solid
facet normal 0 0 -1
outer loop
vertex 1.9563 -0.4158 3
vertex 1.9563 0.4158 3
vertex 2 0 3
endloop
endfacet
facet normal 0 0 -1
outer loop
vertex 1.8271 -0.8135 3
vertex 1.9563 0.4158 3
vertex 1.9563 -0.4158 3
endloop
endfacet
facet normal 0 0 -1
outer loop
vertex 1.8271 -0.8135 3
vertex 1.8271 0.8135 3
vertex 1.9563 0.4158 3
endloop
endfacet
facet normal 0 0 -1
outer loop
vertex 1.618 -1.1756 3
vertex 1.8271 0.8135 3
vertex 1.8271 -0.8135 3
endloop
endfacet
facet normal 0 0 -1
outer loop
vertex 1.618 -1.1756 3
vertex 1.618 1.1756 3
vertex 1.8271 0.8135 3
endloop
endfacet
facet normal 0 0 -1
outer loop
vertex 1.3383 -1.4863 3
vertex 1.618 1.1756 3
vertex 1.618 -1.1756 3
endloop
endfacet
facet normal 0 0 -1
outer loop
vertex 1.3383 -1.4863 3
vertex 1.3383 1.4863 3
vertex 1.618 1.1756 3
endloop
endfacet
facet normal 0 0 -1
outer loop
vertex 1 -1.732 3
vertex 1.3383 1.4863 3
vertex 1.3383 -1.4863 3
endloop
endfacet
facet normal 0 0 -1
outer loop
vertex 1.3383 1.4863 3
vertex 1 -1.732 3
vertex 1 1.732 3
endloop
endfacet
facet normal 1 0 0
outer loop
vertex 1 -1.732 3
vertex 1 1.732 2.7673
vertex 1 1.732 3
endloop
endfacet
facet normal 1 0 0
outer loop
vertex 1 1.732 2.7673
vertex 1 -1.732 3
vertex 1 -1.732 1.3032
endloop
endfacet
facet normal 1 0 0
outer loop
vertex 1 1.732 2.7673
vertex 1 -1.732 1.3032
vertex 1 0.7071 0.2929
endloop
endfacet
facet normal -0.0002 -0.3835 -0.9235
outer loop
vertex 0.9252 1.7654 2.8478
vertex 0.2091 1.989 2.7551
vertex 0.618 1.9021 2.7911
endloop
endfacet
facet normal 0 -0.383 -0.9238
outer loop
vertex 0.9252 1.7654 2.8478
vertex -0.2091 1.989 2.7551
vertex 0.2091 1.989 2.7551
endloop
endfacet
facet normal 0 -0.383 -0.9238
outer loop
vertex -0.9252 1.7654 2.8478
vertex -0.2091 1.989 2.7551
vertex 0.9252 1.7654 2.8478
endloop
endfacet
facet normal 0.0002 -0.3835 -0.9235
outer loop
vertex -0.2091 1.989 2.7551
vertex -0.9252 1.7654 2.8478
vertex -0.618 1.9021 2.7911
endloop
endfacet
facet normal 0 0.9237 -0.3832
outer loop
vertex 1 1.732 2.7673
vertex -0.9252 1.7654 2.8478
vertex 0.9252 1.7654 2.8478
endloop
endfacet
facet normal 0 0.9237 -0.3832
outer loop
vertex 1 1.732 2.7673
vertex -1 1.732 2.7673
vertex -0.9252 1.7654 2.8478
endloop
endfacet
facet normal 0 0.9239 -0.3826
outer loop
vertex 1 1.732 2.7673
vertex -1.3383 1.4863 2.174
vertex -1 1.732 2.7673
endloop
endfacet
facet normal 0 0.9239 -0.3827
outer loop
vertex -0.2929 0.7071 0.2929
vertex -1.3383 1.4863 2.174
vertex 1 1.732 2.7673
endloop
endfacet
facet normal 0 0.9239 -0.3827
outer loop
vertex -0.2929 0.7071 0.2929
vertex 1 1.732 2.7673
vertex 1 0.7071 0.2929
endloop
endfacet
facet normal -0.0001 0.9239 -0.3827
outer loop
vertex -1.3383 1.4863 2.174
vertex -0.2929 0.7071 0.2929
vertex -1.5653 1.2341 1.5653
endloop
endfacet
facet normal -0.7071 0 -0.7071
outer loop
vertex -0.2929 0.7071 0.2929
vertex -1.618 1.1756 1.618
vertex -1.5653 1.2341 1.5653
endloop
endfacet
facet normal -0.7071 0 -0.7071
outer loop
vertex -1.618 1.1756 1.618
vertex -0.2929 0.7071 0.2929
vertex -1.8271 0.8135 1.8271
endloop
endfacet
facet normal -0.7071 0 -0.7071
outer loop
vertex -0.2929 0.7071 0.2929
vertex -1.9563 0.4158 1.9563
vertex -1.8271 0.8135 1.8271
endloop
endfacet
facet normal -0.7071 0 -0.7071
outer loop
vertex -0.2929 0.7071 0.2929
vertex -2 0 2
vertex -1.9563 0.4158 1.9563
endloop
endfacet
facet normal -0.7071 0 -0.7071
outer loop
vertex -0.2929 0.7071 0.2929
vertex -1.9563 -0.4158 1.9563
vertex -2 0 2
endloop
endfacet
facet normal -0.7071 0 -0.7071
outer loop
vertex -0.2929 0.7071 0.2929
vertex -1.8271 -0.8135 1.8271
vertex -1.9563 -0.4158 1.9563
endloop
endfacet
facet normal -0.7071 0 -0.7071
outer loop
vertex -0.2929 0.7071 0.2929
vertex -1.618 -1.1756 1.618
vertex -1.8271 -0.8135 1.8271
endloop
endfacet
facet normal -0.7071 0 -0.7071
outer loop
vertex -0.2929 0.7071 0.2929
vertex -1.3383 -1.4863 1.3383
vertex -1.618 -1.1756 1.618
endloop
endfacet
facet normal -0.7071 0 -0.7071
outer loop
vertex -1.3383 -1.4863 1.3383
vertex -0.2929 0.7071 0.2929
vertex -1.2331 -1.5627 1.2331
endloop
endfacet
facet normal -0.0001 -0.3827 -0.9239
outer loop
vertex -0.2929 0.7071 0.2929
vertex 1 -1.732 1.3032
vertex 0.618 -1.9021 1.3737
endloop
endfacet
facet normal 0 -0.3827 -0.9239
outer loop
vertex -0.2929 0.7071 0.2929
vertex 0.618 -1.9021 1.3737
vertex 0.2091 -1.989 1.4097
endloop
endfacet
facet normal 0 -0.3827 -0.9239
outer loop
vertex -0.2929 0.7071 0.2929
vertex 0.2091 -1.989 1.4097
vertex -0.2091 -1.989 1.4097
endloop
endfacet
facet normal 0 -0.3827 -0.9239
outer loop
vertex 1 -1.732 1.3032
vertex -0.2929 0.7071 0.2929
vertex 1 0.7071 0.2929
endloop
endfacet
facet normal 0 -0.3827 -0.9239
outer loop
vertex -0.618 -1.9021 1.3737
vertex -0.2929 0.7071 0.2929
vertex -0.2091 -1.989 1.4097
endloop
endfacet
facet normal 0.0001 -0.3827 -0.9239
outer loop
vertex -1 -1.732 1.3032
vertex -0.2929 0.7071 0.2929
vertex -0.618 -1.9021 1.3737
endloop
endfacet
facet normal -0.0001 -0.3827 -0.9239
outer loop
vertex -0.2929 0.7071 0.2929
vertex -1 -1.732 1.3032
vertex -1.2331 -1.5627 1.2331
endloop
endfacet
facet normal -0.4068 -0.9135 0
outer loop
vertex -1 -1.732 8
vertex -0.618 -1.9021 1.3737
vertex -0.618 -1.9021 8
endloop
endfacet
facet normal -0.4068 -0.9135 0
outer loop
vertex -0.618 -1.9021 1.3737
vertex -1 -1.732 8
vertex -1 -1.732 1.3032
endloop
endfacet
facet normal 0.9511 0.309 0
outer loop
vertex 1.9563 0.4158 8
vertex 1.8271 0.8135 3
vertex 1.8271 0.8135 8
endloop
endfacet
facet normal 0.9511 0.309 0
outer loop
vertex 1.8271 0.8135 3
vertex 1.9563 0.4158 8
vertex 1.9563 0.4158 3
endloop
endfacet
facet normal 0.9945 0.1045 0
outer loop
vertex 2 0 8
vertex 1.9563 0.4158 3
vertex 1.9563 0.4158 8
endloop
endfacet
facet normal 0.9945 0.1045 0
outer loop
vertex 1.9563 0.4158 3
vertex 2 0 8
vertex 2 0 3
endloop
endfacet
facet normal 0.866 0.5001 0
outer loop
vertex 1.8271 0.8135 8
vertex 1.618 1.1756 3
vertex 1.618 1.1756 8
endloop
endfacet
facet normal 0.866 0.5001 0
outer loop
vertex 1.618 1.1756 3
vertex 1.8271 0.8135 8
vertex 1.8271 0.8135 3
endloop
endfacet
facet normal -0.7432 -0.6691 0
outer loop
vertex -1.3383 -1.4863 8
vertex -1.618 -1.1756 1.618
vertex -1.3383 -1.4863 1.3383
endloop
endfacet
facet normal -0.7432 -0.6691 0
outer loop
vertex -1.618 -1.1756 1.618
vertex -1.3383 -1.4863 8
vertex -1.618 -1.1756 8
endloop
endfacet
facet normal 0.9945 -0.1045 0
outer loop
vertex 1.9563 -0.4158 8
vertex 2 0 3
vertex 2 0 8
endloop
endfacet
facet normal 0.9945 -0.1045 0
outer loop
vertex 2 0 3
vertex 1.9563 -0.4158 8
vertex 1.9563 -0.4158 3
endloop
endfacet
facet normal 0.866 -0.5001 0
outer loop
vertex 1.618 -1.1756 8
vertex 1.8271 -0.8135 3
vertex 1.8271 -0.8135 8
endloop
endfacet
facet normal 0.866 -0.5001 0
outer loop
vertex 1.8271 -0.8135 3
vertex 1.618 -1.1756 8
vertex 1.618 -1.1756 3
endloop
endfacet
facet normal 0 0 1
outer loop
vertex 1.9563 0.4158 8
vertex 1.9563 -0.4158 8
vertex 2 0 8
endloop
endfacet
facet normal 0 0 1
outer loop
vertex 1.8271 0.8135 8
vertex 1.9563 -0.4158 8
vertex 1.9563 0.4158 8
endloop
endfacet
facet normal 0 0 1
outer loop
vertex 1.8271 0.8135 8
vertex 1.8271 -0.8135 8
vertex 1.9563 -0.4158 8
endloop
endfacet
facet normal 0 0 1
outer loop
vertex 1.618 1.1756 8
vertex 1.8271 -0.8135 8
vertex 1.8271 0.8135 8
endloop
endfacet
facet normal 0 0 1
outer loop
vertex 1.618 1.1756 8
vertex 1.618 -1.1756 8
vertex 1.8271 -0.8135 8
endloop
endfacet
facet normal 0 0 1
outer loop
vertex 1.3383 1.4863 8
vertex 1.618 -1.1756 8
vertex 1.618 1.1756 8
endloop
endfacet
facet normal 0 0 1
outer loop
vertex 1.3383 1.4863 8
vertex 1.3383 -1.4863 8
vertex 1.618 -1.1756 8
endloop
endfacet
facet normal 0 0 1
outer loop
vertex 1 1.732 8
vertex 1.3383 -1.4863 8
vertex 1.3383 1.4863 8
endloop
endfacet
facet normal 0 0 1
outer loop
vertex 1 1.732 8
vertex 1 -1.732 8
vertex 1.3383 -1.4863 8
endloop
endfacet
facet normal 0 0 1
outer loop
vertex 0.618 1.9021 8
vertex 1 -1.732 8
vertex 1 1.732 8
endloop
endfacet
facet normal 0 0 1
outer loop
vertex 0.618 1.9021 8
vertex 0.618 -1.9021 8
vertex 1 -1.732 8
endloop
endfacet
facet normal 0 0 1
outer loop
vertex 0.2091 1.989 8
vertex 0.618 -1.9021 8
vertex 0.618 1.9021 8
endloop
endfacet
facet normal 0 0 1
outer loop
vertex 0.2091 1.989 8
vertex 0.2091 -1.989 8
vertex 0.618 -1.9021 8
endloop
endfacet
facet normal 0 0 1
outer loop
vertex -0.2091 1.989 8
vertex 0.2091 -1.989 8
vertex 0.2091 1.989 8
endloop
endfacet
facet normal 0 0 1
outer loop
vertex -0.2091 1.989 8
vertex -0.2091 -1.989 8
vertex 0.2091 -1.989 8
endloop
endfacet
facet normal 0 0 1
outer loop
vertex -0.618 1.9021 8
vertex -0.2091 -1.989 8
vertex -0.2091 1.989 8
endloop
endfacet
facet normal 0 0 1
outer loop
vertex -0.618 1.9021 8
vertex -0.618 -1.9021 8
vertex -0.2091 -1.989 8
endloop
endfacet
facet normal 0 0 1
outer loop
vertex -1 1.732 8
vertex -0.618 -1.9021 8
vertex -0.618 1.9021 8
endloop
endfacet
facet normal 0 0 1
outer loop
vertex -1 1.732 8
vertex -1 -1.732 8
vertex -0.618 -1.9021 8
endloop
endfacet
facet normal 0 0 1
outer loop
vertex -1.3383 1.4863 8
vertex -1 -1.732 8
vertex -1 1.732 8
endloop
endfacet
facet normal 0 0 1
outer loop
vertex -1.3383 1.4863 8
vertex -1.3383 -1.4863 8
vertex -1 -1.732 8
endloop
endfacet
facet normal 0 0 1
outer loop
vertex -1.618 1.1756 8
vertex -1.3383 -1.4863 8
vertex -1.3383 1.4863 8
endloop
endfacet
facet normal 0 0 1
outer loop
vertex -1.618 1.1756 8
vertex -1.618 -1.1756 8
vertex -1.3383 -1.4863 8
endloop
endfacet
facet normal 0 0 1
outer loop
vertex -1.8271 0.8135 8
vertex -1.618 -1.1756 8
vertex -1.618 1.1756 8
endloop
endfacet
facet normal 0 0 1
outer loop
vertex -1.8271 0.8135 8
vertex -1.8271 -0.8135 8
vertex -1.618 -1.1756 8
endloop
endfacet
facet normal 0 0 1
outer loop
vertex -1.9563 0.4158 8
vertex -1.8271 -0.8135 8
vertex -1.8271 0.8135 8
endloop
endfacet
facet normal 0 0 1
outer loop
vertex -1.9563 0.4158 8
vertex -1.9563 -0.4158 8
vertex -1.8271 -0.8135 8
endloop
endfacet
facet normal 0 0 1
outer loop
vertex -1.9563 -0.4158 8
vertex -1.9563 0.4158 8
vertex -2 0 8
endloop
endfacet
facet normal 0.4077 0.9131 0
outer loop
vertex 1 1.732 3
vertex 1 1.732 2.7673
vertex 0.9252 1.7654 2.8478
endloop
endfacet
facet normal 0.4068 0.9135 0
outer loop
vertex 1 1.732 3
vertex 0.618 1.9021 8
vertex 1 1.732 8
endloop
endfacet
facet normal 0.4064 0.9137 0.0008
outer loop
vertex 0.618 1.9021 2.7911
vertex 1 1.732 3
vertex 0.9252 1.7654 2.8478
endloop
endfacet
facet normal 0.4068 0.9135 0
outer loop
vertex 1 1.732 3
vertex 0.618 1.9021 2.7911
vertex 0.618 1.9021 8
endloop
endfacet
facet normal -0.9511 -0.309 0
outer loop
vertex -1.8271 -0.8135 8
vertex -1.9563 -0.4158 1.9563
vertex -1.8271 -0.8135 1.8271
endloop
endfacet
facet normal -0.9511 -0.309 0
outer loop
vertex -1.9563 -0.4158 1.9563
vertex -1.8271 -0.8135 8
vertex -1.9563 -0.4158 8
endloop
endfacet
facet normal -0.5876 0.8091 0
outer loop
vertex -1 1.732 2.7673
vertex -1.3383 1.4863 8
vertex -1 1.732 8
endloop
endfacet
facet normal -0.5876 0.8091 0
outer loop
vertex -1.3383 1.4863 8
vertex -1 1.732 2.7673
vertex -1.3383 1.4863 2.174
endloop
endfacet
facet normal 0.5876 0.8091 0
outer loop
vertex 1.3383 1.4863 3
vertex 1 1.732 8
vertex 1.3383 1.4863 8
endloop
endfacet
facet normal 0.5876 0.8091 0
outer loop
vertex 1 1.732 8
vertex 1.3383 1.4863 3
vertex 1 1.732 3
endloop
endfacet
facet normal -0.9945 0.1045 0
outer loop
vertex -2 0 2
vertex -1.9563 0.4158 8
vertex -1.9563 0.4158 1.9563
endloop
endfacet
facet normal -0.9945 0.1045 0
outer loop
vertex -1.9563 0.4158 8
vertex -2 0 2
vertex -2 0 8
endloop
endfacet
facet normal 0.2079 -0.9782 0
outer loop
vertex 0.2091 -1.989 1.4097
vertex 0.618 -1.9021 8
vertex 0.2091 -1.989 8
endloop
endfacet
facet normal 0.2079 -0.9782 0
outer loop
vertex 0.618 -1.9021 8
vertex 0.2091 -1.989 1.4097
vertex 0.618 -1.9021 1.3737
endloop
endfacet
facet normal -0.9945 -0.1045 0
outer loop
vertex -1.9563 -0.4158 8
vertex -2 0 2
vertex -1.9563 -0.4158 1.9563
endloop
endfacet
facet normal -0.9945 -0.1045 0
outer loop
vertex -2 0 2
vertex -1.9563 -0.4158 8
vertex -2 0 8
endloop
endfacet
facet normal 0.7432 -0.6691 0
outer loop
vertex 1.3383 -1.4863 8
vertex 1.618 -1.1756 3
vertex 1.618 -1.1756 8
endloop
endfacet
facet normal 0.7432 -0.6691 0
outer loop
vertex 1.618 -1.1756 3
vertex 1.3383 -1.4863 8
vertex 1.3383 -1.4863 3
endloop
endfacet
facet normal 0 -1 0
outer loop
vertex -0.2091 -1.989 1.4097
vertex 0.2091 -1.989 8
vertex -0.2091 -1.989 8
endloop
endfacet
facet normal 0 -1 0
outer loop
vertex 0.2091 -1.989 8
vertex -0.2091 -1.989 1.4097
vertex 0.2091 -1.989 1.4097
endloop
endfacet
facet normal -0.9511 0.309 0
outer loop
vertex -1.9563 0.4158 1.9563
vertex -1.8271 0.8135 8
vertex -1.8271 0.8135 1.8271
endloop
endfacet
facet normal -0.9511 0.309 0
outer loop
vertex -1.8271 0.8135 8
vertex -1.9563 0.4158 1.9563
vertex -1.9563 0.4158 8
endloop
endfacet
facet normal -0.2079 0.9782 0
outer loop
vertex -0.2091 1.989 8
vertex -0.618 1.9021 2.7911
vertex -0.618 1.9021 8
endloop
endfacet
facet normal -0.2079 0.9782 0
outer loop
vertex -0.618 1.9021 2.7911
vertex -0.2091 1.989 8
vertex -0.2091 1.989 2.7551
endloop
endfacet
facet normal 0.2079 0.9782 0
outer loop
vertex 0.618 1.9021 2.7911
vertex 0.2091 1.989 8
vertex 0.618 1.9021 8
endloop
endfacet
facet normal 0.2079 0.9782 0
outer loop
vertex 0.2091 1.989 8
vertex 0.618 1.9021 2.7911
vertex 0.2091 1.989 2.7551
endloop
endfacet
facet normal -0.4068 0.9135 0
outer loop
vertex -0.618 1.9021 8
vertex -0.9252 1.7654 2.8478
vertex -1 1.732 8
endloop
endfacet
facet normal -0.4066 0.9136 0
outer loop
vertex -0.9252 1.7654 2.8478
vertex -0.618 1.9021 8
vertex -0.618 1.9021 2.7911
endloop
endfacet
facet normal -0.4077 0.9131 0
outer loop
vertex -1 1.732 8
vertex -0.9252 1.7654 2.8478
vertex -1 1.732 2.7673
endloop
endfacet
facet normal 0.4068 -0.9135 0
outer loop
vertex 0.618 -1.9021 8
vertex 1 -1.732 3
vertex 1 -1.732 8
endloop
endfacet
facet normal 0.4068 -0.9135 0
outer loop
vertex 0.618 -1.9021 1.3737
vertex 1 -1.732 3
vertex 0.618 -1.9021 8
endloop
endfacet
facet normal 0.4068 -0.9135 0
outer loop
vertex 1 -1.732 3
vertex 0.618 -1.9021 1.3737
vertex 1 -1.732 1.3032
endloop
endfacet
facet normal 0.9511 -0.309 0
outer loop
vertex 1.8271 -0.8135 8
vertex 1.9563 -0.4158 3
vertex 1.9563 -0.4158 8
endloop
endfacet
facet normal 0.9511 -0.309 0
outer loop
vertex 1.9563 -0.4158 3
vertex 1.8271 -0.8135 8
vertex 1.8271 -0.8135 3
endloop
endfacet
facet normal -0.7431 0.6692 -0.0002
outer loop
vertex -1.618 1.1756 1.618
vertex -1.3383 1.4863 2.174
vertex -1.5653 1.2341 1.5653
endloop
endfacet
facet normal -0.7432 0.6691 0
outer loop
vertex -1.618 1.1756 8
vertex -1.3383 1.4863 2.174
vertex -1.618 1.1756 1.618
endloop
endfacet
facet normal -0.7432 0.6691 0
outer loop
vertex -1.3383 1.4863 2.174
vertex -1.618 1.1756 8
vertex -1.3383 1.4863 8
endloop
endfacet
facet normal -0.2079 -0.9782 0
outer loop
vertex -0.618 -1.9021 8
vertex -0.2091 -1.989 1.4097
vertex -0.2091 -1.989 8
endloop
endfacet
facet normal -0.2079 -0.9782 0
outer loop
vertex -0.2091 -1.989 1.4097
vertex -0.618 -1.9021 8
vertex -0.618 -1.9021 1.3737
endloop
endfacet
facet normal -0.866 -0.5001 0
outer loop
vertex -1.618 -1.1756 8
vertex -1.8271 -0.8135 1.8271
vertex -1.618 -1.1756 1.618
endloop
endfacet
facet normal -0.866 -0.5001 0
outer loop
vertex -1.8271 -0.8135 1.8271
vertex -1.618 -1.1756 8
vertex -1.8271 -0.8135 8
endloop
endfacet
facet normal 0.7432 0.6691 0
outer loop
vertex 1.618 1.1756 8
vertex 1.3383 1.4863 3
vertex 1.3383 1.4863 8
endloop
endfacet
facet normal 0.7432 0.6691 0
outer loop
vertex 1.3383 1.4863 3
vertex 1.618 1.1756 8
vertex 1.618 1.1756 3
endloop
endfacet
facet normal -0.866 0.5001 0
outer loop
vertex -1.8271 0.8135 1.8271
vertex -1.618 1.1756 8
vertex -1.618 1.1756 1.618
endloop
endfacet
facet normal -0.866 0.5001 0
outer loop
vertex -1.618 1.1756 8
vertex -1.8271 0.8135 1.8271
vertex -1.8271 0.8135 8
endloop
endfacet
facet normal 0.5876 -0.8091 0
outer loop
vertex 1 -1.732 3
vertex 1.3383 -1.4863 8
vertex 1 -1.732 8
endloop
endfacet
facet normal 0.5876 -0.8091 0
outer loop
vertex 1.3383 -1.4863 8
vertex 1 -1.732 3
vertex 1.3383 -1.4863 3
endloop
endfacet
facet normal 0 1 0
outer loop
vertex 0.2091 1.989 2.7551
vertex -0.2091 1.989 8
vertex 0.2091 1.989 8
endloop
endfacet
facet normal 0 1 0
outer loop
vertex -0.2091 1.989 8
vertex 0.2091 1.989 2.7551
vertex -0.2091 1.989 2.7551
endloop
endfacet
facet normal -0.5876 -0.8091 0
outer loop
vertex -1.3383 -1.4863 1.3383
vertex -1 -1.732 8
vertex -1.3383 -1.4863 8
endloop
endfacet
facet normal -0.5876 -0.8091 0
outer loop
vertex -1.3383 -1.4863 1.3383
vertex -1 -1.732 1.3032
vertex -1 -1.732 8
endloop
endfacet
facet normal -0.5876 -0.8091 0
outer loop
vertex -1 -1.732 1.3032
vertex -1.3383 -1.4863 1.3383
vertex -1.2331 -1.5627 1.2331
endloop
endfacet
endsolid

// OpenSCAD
nozzleDiameter = 4;
nozzleFacets = 4;
layerHeight = 1;

$fa = 0.5;
$fs = 0.5;
$fn = 30;

ShaperNozzle(nozzleDiameter, nozzleFacets, layerHeight);

module ShaperNozzle(dia, facets, height)
{
	difference()
	{
		cylinder(r=dia/2, h=dia*2);
		//cube(center=true, size=[dia, dia, dia*2]);

		for(i=[0:facets-1])
			rotate([0,0, 360/facets*i])
				translate([dia/2-height, 0, height])
					rotate([0,90/facets*i,0])
						translate([0,-dia/2, -dia/2])														#cube([dia, dia, dia]);
	}
}
